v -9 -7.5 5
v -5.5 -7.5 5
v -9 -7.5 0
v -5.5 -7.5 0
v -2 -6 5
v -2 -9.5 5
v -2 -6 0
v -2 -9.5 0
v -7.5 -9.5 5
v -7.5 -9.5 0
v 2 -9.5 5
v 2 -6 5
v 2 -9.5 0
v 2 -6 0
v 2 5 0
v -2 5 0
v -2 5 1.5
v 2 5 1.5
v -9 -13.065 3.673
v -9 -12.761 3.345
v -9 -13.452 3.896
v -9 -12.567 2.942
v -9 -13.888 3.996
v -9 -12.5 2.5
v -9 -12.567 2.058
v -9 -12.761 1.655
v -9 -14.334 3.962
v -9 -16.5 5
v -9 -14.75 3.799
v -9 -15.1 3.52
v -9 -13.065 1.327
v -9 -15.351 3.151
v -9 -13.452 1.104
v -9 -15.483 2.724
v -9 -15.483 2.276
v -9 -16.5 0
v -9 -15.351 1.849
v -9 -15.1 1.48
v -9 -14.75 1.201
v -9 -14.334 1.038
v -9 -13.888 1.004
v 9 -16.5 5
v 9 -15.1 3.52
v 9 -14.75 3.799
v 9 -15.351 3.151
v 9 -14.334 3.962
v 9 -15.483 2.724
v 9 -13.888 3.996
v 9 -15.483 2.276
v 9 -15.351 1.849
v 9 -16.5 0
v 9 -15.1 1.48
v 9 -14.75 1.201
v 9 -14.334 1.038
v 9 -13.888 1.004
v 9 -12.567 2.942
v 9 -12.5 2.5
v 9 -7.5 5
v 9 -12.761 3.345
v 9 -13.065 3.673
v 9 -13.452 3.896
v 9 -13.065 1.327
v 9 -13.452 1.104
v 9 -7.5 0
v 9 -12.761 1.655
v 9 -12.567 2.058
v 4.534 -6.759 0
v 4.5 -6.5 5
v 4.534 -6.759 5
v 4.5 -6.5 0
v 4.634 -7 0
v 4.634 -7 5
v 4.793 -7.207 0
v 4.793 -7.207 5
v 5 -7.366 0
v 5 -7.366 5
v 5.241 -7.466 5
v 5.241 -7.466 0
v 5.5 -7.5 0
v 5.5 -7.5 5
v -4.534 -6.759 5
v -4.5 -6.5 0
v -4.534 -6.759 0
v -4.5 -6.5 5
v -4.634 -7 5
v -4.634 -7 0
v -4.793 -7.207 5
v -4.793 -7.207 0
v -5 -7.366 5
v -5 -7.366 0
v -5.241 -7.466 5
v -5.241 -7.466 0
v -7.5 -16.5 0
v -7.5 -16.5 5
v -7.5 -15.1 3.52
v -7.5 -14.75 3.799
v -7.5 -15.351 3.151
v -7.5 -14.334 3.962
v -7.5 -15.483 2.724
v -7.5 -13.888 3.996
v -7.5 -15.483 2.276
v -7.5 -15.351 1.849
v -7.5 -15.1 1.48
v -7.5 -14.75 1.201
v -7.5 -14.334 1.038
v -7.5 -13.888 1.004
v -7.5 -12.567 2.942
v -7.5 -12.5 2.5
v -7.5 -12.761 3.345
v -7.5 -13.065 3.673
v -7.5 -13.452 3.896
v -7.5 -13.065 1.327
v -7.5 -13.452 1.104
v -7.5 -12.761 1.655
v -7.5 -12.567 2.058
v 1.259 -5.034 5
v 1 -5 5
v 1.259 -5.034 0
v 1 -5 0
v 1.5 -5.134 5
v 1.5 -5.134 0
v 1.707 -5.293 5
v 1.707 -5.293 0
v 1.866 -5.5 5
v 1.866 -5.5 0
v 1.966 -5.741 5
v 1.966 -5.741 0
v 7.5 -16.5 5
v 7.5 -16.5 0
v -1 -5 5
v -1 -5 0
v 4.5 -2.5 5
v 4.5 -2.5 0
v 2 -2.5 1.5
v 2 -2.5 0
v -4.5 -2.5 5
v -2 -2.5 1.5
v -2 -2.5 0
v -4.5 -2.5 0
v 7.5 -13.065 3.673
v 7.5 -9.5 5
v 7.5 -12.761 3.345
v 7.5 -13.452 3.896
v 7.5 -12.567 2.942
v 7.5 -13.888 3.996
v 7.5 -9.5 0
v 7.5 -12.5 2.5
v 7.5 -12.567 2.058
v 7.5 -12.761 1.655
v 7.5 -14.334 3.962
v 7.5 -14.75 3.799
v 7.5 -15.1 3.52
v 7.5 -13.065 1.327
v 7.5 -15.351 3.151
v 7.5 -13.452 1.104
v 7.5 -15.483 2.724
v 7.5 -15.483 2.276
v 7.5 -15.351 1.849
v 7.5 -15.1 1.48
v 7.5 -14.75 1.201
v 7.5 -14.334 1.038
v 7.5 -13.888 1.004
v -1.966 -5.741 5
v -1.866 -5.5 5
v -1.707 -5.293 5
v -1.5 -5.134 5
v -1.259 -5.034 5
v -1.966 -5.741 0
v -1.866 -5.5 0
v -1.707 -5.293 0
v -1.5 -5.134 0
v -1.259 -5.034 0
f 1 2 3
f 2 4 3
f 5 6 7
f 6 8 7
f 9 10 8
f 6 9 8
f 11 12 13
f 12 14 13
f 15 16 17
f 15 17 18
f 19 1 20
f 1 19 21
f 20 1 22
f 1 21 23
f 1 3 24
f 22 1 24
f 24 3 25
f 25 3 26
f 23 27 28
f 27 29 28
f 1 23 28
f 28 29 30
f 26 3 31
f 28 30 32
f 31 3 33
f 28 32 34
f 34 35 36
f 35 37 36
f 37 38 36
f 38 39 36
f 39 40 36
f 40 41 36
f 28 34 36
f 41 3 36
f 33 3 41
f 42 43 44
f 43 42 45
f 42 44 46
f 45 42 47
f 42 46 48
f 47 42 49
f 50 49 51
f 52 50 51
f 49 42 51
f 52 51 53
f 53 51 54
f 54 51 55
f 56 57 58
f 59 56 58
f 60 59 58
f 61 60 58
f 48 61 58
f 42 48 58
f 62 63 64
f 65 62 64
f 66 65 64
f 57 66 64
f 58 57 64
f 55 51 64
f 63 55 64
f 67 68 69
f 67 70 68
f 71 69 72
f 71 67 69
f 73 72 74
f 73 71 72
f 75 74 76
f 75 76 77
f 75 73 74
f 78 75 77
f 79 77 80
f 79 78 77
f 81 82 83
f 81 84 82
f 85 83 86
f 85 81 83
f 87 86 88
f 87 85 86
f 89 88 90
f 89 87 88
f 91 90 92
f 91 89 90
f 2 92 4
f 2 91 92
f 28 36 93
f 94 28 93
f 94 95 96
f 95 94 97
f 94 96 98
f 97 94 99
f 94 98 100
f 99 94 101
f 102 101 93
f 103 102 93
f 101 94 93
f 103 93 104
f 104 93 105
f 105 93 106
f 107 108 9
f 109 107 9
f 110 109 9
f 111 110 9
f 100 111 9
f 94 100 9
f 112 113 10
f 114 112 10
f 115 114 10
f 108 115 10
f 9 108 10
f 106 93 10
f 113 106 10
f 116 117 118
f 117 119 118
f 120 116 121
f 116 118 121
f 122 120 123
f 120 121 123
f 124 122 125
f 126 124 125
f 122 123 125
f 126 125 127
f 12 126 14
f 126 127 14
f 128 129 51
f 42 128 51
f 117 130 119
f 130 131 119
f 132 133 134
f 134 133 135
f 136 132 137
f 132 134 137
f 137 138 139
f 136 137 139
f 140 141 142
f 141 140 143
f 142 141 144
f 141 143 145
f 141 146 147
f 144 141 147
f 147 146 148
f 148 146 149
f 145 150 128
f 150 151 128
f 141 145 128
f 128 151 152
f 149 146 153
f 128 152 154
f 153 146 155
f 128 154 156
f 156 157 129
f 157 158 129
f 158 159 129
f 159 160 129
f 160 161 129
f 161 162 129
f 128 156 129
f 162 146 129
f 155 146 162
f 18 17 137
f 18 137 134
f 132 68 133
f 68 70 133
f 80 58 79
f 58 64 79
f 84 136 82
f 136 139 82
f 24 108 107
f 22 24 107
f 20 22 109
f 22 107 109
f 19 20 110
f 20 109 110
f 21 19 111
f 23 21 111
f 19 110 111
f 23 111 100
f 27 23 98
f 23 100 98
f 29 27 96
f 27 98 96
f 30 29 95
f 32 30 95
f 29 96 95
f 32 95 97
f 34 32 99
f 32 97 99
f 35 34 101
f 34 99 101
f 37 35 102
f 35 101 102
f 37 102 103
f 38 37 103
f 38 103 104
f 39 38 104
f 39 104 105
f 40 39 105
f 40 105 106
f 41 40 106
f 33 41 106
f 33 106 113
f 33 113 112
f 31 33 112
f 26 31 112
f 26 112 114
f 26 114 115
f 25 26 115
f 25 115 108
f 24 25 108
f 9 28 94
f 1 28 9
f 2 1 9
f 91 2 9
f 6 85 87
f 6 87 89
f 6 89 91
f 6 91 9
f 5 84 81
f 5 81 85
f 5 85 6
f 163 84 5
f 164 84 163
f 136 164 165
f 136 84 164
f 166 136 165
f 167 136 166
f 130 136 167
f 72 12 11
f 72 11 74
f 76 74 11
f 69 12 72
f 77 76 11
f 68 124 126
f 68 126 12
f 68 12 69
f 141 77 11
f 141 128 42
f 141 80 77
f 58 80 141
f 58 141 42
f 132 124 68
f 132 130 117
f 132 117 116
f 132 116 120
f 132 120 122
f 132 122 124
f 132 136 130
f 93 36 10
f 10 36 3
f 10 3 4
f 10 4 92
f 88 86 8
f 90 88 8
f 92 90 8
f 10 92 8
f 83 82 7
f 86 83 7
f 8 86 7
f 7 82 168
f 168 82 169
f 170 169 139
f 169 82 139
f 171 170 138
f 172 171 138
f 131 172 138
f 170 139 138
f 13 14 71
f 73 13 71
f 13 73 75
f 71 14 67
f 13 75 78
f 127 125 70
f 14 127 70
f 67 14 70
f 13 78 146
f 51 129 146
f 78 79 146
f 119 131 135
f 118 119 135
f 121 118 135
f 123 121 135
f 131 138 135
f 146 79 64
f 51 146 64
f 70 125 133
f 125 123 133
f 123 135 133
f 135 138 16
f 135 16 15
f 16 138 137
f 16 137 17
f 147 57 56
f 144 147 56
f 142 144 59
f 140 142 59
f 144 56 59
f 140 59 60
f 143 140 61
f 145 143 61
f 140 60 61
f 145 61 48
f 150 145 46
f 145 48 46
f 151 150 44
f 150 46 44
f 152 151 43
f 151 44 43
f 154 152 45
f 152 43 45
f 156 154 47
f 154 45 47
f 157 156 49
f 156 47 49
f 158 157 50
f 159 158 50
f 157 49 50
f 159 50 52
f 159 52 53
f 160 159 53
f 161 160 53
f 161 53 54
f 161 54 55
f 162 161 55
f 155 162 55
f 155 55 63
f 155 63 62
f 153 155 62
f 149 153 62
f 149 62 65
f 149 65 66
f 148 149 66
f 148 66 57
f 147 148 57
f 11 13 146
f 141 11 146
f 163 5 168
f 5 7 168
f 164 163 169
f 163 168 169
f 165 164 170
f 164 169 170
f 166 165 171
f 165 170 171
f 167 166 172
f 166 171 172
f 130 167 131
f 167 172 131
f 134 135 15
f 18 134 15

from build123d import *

# Parameters (mm, degrees)
F0_W     = 4
F0_H     = 7.5
F1_DEPTH = 1.5
F2_DEPTH = 5
F4_D     = 3
F5_R     = 1


with BuildPart() as f1:
    # F0 (on Top) → F1 (new body)
    with BuildSketch(Plane.XY):
        with Locations((0, 1.25)):
            Rectangle(F0_W, F0_H)
        Polygon((4.5, -2.5), (2, -2.5), (-2, -2.5), (-4.5, -2.5), (-4.5, -7.5), (-9, -7.5), (-9, -9.5), (-9, -16.5), (-7.5, -16.5), (-7.5, -9.5), (-2, -9.5), (-2, -5), (2, -5), (2, -9.5), (7.5, -9.5), (7.5, -16.5), (9, -16.5), (9, -9.5), (9, -7.5), (4.5, -7.5), align=None)
    extrude(amount=F1_DEPTH)

    # F0 (on Top) → F2 (join)
    with BuildSketch(Plane.XY):
        Polygon((4.5, -2.5), (2, -2.5), (-2, -2.5), (-4.5, -2.5), (-4.5, -7.5), (-9, -7.5), (-9, -9.5), (-9, -16.5), (-7.5, -16.5), (-7.5, -9.5), (-2, -9.5), (-2, -5), (2, -5), (2, -9.5), (7.5, -9.5), (7.5, -16.5), (9, -16.5), (9, -9.5), (9, -7.5), (4.5, -7.5), align=None)
    extrude(amount=F2_DEPTH)

    # F4 (through all)
    with Locations(Plane(origin=(-9, 0, 0), x_dir=(0, -1, 0), z_dir=(-1, 0, 0))):
        with Locations((14, 2.5)):
            Hole(F4_D / 2)

    # F5
    f5_edges = [f1.edges().sort_by_distance(p)[0] for p in [
        (2, -5, 2.5),
        (-2, -5, 2.5),
        (-4.5, -7.5, 2.5),
        (4.5, -7.5, 2.5),
    ]]
    fillet(f5_edges, radius=F5_R)


solid = f1.part
